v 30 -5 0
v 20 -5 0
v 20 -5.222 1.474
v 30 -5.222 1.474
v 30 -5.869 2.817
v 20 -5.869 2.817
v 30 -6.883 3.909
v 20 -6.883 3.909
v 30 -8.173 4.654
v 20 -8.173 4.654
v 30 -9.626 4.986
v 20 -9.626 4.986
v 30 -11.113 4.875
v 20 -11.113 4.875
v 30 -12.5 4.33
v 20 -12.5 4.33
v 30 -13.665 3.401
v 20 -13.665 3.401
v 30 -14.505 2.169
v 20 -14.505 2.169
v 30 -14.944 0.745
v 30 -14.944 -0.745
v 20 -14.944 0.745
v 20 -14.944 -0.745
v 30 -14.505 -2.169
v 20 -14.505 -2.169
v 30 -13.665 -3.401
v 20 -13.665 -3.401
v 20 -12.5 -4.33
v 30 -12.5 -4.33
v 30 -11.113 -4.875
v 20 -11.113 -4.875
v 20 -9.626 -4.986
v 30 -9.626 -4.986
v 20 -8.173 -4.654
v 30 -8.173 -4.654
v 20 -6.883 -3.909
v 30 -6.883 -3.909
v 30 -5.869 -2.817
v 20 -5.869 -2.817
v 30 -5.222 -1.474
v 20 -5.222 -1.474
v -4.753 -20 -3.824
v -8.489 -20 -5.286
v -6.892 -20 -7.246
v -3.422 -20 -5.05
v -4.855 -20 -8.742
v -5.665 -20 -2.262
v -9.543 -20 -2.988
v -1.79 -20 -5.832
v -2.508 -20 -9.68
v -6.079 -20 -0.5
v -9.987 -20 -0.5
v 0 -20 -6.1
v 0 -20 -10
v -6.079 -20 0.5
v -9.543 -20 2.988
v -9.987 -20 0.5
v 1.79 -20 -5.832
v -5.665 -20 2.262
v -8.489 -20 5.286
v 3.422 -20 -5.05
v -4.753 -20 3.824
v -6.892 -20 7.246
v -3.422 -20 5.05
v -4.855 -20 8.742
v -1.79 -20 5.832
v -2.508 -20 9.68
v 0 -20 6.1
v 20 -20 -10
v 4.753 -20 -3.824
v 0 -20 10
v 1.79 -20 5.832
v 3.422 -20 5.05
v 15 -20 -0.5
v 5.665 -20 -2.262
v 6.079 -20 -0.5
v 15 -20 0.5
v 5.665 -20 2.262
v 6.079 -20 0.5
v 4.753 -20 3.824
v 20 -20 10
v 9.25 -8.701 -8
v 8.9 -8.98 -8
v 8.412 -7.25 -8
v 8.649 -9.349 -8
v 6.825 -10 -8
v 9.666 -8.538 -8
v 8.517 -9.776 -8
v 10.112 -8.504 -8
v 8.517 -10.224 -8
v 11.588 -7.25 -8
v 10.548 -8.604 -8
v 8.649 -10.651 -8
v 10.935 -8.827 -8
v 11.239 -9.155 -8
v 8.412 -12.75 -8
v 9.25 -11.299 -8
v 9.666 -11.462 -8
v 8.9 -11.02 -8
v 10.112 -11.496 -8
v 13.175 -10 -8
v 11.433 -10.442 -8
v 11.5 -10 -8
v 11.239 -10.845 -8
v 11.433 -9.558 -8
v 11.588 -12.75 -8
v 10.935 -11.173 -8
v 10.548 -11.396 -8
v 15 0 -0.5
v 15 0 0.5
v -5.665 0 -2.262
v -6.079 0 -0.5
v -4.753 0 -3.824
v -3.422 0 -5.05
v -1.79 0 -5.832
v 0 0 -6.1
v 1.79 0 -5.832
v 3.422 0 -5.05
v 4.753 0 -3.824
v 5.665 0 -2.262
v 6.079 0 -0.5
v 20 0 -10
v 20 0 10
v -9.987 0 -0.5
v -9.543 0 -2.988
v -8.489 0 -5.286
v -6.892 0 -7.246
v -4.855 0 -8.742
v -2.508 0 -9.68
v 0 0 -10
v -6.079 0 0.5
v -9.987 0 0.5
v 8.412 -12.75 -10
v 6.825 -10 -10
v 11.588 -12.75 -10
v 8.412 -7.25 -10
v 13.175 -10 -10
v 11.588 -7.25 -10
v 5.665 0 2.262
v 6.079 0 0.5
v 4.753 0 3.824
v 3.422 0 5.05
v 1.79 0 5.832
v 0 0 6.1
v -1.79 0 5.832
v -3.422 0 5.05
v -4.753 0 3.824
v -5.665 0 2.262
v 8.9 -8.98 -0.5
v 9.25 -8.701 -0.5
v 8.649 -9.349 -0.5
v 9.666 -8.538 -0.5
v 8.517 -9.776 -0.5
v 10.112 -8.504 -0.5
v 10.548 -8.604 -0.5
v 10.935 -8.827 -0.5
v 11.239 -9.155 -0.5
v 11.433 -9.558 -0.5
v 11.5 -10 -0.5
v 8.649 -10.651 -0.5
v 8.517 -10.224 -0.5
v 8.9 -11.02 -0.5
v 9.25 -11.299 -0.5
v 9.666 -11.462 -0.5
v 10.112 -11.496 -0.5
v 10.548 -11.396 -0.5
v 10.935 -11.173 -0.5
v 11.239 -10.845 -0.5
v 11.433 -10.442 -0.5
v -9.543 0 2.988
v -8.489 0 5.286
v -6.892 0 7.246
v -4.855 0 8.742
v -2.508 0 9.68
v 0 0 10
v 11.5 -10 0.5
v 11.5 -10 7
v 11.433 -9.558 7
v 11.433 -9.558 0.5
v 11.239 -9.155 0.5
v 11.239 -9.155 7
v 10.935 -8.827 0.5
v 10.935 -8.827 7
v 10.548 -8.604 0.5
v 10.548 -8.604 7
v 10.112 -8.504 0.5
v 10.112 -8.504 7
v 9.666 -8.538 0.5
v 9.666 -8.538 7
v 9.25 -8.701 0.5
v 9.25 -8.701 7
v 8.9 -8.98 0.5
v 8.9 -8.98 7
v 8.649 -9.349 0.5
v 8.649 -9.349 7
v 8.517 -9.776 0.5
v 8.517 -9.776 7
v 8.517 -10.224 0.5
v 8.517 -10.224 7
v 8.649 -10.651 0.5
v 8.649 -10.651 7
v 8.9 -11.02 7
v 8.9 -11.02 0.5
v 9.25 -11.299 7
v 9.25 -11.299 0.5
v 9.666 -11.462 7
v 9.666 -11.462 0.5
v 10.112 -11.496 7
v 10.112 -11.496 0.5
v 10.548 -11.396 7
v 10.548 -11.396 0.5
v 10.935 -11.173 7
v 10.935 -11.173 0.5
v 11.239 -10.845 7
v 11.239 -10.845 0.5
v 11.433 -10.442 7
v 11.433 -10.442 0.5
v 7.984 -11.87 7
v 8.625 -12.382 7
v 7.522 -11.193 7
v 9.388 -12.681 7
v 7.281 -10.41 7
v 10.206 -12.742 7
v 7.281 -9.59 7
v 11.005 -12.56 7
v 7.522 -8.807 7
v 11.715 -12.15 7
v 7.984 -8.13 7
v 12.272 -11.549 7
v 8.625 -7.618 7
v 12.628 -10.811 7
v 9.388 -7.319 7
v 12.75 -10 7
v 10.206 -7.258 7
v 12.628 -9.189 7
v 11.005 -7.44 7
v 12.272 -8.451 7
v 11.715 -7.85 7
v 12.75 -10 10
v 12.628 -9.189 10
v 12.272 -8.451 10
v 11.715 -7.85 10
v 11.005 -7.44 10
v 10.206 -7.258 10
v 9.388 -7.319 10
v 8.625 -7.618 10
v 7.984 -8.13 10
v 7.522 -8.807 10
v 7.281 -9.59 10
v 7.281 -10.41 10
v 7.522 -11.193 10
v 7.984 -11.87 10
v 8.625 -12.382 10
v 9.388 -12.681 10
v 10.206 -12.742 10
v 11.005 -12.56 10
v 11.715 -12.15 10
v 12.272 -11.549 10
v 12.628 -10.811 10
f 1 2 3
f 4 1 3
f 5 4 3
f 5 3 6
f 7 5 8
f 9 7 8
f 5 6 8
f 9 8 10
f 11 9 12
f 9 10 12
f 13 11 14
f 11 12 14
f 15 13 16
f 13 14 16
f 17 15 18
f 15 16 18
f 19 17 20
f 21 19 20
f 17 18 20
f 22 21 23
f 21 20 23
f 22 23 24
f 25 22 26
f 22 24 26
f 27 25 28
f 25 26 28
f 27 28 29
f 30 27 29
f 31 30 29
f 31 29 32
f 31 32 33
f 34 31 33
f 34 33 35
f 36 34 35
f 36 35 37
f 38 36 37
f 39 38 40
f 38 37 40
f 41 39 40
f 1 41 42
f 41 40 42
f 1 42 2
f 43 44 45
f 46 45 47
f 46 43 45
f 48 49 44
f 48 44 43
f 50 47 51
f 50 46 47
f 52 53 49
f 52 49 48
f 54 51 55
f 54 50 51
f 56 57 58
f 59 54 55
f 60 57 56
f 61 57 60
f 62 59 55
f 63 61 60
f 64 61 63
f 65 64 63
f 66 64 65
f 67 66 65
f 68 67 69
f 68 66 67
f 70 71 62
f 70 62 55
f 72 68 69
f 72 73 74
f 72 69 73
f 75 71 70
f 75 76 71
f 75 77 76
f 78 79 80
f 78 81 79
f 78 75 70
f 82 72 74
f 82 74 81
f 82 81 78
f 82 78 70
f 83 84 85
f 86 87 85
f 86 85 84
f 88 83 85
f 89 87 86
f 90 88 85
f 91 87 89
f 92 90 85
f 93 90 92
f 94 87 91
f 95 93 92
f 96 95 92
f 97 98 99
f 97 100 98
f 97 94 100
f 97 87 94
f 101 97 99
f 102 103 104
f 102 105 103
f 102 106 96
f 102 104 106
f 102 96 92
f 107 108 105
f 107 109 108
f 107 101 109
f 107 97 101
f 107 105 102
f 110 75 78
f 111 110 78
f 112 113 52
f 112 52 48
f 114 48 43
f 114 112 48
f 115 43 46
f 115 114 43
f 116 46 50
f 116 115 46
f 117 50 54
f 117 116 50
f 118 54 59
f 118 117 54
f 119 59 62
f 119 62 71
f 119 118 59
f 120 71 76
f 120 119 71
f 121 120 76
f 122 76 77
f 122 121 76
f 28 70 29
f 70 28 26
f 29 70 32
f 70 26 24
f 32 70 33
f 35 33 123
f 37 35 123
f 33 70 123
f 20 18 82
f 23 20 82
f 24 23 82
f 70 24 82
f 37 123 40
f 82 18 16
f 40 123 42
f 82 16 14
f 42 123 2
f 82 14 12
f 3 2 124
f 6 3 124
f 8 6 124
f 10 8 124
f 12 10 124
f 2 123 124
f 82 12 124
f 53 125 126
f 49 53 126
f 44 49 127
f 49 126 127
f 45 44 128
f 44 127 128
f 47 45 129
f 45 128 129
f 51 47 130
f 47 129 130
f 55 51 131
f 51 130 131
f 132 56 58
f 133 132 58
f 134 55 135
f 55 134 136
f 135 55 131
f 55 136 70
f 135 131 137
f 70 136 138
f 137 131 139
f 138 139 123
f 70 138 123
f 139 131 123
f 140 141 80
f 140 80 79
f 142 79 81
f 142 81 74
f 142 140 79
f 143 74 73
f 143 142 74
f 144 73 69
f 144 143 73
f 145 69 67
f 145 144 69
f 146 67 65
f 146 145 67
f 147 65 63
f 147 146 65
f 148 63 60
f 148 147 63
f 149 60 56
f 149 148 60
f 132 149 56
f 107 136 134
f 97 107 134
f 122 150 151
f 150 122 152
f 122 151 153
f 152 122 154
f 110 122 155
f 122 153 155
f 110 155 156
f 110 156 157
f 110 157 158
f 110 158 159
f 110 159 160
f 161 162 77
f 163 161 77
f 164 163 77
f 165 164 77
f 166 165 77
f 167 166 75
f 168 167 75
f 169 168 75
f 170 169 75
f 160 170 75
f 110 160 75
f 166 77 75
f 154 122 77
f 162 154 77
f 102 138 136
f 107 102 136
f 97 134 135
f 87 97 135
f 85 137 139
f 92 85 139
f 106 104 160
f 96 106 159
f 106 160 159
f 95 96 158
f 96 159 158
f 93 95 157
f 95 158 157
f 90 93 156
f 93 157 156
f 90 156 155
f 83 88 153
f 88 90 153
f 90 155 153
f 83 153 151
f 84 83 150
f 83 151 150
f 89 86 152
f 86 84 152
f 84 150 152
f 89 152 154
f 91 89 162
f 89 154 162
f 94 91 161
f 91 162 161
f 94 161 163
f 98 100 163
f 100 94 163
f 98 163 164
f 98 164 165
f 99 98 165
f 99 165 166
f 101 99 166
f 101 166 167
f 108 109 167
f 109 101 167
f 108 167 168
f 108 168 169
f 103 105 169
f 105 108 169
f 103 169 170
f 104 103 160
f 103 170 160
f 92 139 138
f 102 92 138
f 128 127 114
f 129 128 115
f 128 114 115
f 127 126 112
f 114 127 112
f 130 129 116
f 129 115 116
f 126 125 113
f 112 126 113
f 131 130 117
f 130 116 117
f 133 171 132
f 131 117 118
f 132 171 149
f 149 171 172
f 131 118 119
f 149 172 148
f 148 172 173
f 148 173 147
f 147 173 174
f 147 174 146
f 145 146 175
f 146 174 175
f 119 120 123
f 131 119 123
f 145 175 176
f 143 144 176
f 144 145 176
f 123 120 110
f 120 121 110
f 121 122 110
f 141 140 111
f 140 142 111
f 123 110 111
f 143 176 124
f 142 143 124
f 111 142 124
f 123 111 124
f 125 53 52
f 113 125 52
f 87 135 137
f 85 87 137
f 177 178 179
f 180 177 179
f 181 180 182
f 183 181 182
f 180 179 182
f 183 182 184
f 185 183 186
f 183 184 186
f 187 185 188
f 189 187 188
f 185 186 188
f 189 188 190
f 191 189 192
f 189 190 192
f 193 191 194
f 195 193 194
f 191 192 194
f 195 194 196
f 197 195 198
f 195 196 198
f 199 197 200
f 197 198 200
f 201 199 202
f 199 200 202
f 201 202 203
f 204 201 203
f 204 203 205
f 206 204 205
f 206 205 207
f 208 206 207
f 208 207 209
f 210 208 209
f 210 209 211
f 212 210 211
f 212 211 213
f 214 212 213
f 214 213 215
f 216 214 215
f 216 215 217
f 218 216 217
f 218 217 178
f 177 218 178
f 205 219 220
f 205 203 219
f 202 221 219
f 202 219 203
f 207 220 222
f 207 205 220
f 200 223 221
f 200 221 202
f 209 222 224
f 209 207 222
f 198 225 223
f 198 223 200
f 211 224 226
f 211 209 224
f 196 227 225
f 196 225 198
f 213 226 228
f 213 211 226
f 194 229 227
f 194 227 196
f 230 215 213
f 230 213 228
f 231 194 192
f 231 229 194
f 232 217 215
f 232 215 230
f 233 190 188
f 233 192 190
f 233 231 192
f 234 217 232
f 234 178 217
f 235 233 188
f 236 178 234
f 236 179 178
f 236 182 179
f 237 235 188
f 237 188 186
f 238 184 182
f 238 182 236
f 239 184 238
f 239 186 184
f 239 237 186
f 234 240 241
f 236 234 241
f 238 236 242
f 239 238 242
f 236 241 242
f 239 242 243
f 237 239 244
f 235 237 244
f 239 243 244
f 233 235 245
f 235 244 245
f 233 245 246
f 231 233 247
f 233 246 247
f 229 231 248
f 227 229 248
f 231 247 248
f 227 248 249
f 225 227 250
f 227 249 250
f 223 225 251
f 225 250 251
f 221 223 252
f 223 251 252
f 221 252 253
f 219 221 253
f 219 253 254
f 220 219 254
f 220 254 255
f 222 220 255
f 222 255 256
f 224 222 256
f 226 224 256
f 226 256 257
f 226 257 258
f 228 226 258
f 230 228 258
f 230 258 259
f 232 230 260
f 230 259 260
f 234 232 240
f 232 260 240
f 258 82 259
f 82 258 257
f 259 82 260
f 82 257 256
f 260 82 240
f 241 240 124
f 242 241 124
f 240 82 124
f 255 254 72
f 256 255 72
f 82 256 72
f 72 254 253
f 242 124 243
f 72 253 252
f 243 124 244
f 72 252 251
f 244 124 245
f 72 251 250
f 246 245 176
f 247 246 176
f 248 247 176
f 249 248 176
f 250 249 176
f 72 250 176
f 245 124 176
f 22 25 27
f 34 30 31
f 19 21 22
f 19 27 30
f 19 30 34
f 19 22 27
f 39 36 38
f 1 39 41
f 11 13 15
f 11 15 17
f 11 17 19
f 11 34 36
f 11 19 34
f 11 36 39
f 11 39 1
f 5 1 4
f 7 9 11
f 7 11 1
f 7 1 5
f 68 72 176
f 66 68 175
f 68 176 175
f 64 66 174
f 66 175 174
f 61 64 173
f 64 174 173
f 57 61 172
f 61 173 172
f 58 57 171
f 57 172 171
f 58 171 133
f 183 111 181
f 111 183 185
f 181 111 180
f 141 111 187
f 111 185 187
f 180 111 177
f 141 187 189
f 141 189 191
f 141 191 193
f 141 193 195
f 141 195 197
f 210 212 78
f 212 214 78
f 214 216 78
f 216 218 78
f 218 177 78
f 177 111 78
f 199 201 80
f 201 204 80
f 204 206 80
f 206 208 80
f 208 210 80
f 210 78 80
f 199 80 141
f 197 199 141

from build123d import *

# Parameters (mm, degrees)
F0_R      = 6.1
F1_DEPTH  = 20
F3_R      = 1.5
F4_DEPTH  = 25
F5_DEPTH  = 25
F6_R      = 5
F7_DEPTH  = 10
F8_R      = 2.75
F8_R_2    = 1.5
F9_DEPTH  = 3
F10_R     = 1.5
F11_DEPTH = 2


with BuildPart() as f1:
    # F0 (on Front) → F1 (new body)
    with BuildSketch(Plane.XZ):
        with BuildLine():
            ThreePointArc((0, 10), (7.0710678119, 7.0710678119), (10, 0))
            ThreePointArc((10, 0), (7.0710678119, -7.0710678119), (0, -10))
            Line((0, -10), (20, -10))
            Line((20, -10), (20, 10))
            Line((20, 10), (0, 10))
        make_face()
        with BuildLine():
            ThreePointArc((0, -10), (7.0710678119, -7.0710678119), (10, 0))
            ThreePointArc((10, 0), (7.0710678119, 7.0710678119), (0, 10))
            ThreePointArc((0, 10), (-10, 0), (0, -10))
        make_face()
        Circle(F0_R, mode=Mode.SUBTRACT)
    extrude(amount=F1_DEPTH)

    # F3 (on face) → F4 (cut)
    with BuildSketch(Plane.XY.offset(10)):
        with Locations((10, -10)):
            Circle(F3_R)
    extrude(amount=-F4_DEPTH, mode=Mode.SUBTRACT)

    # F2 (on face) → F5 (cut)
    with BuildSketch(Plane.XZ.offset(20)):
        with BuildLine():
            Line((-9.9874921777, 0.5), (-17.8410350345, 0.5))
            Line((-17.8410350345, 0.5), (-17.8410350345, -0.5))
            Line((-17.8410350345, -0.5), (-9.9874921777, -0.5))
            ThreePointArc((-9.9874921777, -0.5), (-10, 0), (-9.9874921777, 0.5))
        make_face()
        with BuildLine():
            Line((-6.0794736614, 0.5), (-9.9874921777, 0.5))
            ThreePointArc((-9.9874921777, 0.5), (-10, 0), (-9.9874921777, -0.5))
            Line((-9.9874921777, -0.5), (-6.0794736614, -0.5))
            ThreePointArc((-6.0794736614, -0.5), (-6.1, 0), (-6.0794736614, 0.5))
        make_face()
        with BuildLine():
            Line((15, 0.5), (6.0794736614, 0.5))
            ThreePointArc((6.0794736614, 0.5), (6.0948662551, 0.2502105766), (6.1, 0))
            ThreePointArc((6.1, 0), (6.0948662551, -0.2502105766), (6.0794736614, -0.5))
            Line((6.0794736614, -0.5), (15, -0.5))
            Line((15, -0.5), (15, 0.5))
        make_face()
    extrude(amount=-F5_DEPTH, mode=Mode.SUBTRACT)

    # F6 (on face) → F7 (join)
    with BuildSketch(Plane.YZ.offset(20)):
        with Locations((-10, 0)):
            Circle(F6_R)
    extrude(amount=F7_DEPTH)

    # F8 (on face) → F9 (cut)
    with BuildSketch(Plane.XY.offset(10)):
        with Locations((10, -10)):
            Circle(F8_R)
        with Locations((10, -10)):
            Circle(F8_R_2, mode=Mode.SUBTRACT)
    extrude(amount=-F9_DEPTH, mode=Mode.SUBTRACT)

    # F10 (on face) → F11 (cut)
    with BuildSketch(Plane(origin=(0, 0, -10), x_dir=(1, 0, 0), z_dir=(0, 0, -1))):
        Polygon((11.5877132403, 12.75), (8.4122867597, 12.75), (6.8245735195, 10), (8.4122867597, 7.25), (11.5877132403, 7.25), (13.1754264805, 10), align=None)
        with Locations((10, 10)):
            Circle(F10_R, mode=Mode.SUBTRACT)
    extrude(amount=-F11_DEPTH, mode=Mode.SUBTRACT)


solid = f1.part
